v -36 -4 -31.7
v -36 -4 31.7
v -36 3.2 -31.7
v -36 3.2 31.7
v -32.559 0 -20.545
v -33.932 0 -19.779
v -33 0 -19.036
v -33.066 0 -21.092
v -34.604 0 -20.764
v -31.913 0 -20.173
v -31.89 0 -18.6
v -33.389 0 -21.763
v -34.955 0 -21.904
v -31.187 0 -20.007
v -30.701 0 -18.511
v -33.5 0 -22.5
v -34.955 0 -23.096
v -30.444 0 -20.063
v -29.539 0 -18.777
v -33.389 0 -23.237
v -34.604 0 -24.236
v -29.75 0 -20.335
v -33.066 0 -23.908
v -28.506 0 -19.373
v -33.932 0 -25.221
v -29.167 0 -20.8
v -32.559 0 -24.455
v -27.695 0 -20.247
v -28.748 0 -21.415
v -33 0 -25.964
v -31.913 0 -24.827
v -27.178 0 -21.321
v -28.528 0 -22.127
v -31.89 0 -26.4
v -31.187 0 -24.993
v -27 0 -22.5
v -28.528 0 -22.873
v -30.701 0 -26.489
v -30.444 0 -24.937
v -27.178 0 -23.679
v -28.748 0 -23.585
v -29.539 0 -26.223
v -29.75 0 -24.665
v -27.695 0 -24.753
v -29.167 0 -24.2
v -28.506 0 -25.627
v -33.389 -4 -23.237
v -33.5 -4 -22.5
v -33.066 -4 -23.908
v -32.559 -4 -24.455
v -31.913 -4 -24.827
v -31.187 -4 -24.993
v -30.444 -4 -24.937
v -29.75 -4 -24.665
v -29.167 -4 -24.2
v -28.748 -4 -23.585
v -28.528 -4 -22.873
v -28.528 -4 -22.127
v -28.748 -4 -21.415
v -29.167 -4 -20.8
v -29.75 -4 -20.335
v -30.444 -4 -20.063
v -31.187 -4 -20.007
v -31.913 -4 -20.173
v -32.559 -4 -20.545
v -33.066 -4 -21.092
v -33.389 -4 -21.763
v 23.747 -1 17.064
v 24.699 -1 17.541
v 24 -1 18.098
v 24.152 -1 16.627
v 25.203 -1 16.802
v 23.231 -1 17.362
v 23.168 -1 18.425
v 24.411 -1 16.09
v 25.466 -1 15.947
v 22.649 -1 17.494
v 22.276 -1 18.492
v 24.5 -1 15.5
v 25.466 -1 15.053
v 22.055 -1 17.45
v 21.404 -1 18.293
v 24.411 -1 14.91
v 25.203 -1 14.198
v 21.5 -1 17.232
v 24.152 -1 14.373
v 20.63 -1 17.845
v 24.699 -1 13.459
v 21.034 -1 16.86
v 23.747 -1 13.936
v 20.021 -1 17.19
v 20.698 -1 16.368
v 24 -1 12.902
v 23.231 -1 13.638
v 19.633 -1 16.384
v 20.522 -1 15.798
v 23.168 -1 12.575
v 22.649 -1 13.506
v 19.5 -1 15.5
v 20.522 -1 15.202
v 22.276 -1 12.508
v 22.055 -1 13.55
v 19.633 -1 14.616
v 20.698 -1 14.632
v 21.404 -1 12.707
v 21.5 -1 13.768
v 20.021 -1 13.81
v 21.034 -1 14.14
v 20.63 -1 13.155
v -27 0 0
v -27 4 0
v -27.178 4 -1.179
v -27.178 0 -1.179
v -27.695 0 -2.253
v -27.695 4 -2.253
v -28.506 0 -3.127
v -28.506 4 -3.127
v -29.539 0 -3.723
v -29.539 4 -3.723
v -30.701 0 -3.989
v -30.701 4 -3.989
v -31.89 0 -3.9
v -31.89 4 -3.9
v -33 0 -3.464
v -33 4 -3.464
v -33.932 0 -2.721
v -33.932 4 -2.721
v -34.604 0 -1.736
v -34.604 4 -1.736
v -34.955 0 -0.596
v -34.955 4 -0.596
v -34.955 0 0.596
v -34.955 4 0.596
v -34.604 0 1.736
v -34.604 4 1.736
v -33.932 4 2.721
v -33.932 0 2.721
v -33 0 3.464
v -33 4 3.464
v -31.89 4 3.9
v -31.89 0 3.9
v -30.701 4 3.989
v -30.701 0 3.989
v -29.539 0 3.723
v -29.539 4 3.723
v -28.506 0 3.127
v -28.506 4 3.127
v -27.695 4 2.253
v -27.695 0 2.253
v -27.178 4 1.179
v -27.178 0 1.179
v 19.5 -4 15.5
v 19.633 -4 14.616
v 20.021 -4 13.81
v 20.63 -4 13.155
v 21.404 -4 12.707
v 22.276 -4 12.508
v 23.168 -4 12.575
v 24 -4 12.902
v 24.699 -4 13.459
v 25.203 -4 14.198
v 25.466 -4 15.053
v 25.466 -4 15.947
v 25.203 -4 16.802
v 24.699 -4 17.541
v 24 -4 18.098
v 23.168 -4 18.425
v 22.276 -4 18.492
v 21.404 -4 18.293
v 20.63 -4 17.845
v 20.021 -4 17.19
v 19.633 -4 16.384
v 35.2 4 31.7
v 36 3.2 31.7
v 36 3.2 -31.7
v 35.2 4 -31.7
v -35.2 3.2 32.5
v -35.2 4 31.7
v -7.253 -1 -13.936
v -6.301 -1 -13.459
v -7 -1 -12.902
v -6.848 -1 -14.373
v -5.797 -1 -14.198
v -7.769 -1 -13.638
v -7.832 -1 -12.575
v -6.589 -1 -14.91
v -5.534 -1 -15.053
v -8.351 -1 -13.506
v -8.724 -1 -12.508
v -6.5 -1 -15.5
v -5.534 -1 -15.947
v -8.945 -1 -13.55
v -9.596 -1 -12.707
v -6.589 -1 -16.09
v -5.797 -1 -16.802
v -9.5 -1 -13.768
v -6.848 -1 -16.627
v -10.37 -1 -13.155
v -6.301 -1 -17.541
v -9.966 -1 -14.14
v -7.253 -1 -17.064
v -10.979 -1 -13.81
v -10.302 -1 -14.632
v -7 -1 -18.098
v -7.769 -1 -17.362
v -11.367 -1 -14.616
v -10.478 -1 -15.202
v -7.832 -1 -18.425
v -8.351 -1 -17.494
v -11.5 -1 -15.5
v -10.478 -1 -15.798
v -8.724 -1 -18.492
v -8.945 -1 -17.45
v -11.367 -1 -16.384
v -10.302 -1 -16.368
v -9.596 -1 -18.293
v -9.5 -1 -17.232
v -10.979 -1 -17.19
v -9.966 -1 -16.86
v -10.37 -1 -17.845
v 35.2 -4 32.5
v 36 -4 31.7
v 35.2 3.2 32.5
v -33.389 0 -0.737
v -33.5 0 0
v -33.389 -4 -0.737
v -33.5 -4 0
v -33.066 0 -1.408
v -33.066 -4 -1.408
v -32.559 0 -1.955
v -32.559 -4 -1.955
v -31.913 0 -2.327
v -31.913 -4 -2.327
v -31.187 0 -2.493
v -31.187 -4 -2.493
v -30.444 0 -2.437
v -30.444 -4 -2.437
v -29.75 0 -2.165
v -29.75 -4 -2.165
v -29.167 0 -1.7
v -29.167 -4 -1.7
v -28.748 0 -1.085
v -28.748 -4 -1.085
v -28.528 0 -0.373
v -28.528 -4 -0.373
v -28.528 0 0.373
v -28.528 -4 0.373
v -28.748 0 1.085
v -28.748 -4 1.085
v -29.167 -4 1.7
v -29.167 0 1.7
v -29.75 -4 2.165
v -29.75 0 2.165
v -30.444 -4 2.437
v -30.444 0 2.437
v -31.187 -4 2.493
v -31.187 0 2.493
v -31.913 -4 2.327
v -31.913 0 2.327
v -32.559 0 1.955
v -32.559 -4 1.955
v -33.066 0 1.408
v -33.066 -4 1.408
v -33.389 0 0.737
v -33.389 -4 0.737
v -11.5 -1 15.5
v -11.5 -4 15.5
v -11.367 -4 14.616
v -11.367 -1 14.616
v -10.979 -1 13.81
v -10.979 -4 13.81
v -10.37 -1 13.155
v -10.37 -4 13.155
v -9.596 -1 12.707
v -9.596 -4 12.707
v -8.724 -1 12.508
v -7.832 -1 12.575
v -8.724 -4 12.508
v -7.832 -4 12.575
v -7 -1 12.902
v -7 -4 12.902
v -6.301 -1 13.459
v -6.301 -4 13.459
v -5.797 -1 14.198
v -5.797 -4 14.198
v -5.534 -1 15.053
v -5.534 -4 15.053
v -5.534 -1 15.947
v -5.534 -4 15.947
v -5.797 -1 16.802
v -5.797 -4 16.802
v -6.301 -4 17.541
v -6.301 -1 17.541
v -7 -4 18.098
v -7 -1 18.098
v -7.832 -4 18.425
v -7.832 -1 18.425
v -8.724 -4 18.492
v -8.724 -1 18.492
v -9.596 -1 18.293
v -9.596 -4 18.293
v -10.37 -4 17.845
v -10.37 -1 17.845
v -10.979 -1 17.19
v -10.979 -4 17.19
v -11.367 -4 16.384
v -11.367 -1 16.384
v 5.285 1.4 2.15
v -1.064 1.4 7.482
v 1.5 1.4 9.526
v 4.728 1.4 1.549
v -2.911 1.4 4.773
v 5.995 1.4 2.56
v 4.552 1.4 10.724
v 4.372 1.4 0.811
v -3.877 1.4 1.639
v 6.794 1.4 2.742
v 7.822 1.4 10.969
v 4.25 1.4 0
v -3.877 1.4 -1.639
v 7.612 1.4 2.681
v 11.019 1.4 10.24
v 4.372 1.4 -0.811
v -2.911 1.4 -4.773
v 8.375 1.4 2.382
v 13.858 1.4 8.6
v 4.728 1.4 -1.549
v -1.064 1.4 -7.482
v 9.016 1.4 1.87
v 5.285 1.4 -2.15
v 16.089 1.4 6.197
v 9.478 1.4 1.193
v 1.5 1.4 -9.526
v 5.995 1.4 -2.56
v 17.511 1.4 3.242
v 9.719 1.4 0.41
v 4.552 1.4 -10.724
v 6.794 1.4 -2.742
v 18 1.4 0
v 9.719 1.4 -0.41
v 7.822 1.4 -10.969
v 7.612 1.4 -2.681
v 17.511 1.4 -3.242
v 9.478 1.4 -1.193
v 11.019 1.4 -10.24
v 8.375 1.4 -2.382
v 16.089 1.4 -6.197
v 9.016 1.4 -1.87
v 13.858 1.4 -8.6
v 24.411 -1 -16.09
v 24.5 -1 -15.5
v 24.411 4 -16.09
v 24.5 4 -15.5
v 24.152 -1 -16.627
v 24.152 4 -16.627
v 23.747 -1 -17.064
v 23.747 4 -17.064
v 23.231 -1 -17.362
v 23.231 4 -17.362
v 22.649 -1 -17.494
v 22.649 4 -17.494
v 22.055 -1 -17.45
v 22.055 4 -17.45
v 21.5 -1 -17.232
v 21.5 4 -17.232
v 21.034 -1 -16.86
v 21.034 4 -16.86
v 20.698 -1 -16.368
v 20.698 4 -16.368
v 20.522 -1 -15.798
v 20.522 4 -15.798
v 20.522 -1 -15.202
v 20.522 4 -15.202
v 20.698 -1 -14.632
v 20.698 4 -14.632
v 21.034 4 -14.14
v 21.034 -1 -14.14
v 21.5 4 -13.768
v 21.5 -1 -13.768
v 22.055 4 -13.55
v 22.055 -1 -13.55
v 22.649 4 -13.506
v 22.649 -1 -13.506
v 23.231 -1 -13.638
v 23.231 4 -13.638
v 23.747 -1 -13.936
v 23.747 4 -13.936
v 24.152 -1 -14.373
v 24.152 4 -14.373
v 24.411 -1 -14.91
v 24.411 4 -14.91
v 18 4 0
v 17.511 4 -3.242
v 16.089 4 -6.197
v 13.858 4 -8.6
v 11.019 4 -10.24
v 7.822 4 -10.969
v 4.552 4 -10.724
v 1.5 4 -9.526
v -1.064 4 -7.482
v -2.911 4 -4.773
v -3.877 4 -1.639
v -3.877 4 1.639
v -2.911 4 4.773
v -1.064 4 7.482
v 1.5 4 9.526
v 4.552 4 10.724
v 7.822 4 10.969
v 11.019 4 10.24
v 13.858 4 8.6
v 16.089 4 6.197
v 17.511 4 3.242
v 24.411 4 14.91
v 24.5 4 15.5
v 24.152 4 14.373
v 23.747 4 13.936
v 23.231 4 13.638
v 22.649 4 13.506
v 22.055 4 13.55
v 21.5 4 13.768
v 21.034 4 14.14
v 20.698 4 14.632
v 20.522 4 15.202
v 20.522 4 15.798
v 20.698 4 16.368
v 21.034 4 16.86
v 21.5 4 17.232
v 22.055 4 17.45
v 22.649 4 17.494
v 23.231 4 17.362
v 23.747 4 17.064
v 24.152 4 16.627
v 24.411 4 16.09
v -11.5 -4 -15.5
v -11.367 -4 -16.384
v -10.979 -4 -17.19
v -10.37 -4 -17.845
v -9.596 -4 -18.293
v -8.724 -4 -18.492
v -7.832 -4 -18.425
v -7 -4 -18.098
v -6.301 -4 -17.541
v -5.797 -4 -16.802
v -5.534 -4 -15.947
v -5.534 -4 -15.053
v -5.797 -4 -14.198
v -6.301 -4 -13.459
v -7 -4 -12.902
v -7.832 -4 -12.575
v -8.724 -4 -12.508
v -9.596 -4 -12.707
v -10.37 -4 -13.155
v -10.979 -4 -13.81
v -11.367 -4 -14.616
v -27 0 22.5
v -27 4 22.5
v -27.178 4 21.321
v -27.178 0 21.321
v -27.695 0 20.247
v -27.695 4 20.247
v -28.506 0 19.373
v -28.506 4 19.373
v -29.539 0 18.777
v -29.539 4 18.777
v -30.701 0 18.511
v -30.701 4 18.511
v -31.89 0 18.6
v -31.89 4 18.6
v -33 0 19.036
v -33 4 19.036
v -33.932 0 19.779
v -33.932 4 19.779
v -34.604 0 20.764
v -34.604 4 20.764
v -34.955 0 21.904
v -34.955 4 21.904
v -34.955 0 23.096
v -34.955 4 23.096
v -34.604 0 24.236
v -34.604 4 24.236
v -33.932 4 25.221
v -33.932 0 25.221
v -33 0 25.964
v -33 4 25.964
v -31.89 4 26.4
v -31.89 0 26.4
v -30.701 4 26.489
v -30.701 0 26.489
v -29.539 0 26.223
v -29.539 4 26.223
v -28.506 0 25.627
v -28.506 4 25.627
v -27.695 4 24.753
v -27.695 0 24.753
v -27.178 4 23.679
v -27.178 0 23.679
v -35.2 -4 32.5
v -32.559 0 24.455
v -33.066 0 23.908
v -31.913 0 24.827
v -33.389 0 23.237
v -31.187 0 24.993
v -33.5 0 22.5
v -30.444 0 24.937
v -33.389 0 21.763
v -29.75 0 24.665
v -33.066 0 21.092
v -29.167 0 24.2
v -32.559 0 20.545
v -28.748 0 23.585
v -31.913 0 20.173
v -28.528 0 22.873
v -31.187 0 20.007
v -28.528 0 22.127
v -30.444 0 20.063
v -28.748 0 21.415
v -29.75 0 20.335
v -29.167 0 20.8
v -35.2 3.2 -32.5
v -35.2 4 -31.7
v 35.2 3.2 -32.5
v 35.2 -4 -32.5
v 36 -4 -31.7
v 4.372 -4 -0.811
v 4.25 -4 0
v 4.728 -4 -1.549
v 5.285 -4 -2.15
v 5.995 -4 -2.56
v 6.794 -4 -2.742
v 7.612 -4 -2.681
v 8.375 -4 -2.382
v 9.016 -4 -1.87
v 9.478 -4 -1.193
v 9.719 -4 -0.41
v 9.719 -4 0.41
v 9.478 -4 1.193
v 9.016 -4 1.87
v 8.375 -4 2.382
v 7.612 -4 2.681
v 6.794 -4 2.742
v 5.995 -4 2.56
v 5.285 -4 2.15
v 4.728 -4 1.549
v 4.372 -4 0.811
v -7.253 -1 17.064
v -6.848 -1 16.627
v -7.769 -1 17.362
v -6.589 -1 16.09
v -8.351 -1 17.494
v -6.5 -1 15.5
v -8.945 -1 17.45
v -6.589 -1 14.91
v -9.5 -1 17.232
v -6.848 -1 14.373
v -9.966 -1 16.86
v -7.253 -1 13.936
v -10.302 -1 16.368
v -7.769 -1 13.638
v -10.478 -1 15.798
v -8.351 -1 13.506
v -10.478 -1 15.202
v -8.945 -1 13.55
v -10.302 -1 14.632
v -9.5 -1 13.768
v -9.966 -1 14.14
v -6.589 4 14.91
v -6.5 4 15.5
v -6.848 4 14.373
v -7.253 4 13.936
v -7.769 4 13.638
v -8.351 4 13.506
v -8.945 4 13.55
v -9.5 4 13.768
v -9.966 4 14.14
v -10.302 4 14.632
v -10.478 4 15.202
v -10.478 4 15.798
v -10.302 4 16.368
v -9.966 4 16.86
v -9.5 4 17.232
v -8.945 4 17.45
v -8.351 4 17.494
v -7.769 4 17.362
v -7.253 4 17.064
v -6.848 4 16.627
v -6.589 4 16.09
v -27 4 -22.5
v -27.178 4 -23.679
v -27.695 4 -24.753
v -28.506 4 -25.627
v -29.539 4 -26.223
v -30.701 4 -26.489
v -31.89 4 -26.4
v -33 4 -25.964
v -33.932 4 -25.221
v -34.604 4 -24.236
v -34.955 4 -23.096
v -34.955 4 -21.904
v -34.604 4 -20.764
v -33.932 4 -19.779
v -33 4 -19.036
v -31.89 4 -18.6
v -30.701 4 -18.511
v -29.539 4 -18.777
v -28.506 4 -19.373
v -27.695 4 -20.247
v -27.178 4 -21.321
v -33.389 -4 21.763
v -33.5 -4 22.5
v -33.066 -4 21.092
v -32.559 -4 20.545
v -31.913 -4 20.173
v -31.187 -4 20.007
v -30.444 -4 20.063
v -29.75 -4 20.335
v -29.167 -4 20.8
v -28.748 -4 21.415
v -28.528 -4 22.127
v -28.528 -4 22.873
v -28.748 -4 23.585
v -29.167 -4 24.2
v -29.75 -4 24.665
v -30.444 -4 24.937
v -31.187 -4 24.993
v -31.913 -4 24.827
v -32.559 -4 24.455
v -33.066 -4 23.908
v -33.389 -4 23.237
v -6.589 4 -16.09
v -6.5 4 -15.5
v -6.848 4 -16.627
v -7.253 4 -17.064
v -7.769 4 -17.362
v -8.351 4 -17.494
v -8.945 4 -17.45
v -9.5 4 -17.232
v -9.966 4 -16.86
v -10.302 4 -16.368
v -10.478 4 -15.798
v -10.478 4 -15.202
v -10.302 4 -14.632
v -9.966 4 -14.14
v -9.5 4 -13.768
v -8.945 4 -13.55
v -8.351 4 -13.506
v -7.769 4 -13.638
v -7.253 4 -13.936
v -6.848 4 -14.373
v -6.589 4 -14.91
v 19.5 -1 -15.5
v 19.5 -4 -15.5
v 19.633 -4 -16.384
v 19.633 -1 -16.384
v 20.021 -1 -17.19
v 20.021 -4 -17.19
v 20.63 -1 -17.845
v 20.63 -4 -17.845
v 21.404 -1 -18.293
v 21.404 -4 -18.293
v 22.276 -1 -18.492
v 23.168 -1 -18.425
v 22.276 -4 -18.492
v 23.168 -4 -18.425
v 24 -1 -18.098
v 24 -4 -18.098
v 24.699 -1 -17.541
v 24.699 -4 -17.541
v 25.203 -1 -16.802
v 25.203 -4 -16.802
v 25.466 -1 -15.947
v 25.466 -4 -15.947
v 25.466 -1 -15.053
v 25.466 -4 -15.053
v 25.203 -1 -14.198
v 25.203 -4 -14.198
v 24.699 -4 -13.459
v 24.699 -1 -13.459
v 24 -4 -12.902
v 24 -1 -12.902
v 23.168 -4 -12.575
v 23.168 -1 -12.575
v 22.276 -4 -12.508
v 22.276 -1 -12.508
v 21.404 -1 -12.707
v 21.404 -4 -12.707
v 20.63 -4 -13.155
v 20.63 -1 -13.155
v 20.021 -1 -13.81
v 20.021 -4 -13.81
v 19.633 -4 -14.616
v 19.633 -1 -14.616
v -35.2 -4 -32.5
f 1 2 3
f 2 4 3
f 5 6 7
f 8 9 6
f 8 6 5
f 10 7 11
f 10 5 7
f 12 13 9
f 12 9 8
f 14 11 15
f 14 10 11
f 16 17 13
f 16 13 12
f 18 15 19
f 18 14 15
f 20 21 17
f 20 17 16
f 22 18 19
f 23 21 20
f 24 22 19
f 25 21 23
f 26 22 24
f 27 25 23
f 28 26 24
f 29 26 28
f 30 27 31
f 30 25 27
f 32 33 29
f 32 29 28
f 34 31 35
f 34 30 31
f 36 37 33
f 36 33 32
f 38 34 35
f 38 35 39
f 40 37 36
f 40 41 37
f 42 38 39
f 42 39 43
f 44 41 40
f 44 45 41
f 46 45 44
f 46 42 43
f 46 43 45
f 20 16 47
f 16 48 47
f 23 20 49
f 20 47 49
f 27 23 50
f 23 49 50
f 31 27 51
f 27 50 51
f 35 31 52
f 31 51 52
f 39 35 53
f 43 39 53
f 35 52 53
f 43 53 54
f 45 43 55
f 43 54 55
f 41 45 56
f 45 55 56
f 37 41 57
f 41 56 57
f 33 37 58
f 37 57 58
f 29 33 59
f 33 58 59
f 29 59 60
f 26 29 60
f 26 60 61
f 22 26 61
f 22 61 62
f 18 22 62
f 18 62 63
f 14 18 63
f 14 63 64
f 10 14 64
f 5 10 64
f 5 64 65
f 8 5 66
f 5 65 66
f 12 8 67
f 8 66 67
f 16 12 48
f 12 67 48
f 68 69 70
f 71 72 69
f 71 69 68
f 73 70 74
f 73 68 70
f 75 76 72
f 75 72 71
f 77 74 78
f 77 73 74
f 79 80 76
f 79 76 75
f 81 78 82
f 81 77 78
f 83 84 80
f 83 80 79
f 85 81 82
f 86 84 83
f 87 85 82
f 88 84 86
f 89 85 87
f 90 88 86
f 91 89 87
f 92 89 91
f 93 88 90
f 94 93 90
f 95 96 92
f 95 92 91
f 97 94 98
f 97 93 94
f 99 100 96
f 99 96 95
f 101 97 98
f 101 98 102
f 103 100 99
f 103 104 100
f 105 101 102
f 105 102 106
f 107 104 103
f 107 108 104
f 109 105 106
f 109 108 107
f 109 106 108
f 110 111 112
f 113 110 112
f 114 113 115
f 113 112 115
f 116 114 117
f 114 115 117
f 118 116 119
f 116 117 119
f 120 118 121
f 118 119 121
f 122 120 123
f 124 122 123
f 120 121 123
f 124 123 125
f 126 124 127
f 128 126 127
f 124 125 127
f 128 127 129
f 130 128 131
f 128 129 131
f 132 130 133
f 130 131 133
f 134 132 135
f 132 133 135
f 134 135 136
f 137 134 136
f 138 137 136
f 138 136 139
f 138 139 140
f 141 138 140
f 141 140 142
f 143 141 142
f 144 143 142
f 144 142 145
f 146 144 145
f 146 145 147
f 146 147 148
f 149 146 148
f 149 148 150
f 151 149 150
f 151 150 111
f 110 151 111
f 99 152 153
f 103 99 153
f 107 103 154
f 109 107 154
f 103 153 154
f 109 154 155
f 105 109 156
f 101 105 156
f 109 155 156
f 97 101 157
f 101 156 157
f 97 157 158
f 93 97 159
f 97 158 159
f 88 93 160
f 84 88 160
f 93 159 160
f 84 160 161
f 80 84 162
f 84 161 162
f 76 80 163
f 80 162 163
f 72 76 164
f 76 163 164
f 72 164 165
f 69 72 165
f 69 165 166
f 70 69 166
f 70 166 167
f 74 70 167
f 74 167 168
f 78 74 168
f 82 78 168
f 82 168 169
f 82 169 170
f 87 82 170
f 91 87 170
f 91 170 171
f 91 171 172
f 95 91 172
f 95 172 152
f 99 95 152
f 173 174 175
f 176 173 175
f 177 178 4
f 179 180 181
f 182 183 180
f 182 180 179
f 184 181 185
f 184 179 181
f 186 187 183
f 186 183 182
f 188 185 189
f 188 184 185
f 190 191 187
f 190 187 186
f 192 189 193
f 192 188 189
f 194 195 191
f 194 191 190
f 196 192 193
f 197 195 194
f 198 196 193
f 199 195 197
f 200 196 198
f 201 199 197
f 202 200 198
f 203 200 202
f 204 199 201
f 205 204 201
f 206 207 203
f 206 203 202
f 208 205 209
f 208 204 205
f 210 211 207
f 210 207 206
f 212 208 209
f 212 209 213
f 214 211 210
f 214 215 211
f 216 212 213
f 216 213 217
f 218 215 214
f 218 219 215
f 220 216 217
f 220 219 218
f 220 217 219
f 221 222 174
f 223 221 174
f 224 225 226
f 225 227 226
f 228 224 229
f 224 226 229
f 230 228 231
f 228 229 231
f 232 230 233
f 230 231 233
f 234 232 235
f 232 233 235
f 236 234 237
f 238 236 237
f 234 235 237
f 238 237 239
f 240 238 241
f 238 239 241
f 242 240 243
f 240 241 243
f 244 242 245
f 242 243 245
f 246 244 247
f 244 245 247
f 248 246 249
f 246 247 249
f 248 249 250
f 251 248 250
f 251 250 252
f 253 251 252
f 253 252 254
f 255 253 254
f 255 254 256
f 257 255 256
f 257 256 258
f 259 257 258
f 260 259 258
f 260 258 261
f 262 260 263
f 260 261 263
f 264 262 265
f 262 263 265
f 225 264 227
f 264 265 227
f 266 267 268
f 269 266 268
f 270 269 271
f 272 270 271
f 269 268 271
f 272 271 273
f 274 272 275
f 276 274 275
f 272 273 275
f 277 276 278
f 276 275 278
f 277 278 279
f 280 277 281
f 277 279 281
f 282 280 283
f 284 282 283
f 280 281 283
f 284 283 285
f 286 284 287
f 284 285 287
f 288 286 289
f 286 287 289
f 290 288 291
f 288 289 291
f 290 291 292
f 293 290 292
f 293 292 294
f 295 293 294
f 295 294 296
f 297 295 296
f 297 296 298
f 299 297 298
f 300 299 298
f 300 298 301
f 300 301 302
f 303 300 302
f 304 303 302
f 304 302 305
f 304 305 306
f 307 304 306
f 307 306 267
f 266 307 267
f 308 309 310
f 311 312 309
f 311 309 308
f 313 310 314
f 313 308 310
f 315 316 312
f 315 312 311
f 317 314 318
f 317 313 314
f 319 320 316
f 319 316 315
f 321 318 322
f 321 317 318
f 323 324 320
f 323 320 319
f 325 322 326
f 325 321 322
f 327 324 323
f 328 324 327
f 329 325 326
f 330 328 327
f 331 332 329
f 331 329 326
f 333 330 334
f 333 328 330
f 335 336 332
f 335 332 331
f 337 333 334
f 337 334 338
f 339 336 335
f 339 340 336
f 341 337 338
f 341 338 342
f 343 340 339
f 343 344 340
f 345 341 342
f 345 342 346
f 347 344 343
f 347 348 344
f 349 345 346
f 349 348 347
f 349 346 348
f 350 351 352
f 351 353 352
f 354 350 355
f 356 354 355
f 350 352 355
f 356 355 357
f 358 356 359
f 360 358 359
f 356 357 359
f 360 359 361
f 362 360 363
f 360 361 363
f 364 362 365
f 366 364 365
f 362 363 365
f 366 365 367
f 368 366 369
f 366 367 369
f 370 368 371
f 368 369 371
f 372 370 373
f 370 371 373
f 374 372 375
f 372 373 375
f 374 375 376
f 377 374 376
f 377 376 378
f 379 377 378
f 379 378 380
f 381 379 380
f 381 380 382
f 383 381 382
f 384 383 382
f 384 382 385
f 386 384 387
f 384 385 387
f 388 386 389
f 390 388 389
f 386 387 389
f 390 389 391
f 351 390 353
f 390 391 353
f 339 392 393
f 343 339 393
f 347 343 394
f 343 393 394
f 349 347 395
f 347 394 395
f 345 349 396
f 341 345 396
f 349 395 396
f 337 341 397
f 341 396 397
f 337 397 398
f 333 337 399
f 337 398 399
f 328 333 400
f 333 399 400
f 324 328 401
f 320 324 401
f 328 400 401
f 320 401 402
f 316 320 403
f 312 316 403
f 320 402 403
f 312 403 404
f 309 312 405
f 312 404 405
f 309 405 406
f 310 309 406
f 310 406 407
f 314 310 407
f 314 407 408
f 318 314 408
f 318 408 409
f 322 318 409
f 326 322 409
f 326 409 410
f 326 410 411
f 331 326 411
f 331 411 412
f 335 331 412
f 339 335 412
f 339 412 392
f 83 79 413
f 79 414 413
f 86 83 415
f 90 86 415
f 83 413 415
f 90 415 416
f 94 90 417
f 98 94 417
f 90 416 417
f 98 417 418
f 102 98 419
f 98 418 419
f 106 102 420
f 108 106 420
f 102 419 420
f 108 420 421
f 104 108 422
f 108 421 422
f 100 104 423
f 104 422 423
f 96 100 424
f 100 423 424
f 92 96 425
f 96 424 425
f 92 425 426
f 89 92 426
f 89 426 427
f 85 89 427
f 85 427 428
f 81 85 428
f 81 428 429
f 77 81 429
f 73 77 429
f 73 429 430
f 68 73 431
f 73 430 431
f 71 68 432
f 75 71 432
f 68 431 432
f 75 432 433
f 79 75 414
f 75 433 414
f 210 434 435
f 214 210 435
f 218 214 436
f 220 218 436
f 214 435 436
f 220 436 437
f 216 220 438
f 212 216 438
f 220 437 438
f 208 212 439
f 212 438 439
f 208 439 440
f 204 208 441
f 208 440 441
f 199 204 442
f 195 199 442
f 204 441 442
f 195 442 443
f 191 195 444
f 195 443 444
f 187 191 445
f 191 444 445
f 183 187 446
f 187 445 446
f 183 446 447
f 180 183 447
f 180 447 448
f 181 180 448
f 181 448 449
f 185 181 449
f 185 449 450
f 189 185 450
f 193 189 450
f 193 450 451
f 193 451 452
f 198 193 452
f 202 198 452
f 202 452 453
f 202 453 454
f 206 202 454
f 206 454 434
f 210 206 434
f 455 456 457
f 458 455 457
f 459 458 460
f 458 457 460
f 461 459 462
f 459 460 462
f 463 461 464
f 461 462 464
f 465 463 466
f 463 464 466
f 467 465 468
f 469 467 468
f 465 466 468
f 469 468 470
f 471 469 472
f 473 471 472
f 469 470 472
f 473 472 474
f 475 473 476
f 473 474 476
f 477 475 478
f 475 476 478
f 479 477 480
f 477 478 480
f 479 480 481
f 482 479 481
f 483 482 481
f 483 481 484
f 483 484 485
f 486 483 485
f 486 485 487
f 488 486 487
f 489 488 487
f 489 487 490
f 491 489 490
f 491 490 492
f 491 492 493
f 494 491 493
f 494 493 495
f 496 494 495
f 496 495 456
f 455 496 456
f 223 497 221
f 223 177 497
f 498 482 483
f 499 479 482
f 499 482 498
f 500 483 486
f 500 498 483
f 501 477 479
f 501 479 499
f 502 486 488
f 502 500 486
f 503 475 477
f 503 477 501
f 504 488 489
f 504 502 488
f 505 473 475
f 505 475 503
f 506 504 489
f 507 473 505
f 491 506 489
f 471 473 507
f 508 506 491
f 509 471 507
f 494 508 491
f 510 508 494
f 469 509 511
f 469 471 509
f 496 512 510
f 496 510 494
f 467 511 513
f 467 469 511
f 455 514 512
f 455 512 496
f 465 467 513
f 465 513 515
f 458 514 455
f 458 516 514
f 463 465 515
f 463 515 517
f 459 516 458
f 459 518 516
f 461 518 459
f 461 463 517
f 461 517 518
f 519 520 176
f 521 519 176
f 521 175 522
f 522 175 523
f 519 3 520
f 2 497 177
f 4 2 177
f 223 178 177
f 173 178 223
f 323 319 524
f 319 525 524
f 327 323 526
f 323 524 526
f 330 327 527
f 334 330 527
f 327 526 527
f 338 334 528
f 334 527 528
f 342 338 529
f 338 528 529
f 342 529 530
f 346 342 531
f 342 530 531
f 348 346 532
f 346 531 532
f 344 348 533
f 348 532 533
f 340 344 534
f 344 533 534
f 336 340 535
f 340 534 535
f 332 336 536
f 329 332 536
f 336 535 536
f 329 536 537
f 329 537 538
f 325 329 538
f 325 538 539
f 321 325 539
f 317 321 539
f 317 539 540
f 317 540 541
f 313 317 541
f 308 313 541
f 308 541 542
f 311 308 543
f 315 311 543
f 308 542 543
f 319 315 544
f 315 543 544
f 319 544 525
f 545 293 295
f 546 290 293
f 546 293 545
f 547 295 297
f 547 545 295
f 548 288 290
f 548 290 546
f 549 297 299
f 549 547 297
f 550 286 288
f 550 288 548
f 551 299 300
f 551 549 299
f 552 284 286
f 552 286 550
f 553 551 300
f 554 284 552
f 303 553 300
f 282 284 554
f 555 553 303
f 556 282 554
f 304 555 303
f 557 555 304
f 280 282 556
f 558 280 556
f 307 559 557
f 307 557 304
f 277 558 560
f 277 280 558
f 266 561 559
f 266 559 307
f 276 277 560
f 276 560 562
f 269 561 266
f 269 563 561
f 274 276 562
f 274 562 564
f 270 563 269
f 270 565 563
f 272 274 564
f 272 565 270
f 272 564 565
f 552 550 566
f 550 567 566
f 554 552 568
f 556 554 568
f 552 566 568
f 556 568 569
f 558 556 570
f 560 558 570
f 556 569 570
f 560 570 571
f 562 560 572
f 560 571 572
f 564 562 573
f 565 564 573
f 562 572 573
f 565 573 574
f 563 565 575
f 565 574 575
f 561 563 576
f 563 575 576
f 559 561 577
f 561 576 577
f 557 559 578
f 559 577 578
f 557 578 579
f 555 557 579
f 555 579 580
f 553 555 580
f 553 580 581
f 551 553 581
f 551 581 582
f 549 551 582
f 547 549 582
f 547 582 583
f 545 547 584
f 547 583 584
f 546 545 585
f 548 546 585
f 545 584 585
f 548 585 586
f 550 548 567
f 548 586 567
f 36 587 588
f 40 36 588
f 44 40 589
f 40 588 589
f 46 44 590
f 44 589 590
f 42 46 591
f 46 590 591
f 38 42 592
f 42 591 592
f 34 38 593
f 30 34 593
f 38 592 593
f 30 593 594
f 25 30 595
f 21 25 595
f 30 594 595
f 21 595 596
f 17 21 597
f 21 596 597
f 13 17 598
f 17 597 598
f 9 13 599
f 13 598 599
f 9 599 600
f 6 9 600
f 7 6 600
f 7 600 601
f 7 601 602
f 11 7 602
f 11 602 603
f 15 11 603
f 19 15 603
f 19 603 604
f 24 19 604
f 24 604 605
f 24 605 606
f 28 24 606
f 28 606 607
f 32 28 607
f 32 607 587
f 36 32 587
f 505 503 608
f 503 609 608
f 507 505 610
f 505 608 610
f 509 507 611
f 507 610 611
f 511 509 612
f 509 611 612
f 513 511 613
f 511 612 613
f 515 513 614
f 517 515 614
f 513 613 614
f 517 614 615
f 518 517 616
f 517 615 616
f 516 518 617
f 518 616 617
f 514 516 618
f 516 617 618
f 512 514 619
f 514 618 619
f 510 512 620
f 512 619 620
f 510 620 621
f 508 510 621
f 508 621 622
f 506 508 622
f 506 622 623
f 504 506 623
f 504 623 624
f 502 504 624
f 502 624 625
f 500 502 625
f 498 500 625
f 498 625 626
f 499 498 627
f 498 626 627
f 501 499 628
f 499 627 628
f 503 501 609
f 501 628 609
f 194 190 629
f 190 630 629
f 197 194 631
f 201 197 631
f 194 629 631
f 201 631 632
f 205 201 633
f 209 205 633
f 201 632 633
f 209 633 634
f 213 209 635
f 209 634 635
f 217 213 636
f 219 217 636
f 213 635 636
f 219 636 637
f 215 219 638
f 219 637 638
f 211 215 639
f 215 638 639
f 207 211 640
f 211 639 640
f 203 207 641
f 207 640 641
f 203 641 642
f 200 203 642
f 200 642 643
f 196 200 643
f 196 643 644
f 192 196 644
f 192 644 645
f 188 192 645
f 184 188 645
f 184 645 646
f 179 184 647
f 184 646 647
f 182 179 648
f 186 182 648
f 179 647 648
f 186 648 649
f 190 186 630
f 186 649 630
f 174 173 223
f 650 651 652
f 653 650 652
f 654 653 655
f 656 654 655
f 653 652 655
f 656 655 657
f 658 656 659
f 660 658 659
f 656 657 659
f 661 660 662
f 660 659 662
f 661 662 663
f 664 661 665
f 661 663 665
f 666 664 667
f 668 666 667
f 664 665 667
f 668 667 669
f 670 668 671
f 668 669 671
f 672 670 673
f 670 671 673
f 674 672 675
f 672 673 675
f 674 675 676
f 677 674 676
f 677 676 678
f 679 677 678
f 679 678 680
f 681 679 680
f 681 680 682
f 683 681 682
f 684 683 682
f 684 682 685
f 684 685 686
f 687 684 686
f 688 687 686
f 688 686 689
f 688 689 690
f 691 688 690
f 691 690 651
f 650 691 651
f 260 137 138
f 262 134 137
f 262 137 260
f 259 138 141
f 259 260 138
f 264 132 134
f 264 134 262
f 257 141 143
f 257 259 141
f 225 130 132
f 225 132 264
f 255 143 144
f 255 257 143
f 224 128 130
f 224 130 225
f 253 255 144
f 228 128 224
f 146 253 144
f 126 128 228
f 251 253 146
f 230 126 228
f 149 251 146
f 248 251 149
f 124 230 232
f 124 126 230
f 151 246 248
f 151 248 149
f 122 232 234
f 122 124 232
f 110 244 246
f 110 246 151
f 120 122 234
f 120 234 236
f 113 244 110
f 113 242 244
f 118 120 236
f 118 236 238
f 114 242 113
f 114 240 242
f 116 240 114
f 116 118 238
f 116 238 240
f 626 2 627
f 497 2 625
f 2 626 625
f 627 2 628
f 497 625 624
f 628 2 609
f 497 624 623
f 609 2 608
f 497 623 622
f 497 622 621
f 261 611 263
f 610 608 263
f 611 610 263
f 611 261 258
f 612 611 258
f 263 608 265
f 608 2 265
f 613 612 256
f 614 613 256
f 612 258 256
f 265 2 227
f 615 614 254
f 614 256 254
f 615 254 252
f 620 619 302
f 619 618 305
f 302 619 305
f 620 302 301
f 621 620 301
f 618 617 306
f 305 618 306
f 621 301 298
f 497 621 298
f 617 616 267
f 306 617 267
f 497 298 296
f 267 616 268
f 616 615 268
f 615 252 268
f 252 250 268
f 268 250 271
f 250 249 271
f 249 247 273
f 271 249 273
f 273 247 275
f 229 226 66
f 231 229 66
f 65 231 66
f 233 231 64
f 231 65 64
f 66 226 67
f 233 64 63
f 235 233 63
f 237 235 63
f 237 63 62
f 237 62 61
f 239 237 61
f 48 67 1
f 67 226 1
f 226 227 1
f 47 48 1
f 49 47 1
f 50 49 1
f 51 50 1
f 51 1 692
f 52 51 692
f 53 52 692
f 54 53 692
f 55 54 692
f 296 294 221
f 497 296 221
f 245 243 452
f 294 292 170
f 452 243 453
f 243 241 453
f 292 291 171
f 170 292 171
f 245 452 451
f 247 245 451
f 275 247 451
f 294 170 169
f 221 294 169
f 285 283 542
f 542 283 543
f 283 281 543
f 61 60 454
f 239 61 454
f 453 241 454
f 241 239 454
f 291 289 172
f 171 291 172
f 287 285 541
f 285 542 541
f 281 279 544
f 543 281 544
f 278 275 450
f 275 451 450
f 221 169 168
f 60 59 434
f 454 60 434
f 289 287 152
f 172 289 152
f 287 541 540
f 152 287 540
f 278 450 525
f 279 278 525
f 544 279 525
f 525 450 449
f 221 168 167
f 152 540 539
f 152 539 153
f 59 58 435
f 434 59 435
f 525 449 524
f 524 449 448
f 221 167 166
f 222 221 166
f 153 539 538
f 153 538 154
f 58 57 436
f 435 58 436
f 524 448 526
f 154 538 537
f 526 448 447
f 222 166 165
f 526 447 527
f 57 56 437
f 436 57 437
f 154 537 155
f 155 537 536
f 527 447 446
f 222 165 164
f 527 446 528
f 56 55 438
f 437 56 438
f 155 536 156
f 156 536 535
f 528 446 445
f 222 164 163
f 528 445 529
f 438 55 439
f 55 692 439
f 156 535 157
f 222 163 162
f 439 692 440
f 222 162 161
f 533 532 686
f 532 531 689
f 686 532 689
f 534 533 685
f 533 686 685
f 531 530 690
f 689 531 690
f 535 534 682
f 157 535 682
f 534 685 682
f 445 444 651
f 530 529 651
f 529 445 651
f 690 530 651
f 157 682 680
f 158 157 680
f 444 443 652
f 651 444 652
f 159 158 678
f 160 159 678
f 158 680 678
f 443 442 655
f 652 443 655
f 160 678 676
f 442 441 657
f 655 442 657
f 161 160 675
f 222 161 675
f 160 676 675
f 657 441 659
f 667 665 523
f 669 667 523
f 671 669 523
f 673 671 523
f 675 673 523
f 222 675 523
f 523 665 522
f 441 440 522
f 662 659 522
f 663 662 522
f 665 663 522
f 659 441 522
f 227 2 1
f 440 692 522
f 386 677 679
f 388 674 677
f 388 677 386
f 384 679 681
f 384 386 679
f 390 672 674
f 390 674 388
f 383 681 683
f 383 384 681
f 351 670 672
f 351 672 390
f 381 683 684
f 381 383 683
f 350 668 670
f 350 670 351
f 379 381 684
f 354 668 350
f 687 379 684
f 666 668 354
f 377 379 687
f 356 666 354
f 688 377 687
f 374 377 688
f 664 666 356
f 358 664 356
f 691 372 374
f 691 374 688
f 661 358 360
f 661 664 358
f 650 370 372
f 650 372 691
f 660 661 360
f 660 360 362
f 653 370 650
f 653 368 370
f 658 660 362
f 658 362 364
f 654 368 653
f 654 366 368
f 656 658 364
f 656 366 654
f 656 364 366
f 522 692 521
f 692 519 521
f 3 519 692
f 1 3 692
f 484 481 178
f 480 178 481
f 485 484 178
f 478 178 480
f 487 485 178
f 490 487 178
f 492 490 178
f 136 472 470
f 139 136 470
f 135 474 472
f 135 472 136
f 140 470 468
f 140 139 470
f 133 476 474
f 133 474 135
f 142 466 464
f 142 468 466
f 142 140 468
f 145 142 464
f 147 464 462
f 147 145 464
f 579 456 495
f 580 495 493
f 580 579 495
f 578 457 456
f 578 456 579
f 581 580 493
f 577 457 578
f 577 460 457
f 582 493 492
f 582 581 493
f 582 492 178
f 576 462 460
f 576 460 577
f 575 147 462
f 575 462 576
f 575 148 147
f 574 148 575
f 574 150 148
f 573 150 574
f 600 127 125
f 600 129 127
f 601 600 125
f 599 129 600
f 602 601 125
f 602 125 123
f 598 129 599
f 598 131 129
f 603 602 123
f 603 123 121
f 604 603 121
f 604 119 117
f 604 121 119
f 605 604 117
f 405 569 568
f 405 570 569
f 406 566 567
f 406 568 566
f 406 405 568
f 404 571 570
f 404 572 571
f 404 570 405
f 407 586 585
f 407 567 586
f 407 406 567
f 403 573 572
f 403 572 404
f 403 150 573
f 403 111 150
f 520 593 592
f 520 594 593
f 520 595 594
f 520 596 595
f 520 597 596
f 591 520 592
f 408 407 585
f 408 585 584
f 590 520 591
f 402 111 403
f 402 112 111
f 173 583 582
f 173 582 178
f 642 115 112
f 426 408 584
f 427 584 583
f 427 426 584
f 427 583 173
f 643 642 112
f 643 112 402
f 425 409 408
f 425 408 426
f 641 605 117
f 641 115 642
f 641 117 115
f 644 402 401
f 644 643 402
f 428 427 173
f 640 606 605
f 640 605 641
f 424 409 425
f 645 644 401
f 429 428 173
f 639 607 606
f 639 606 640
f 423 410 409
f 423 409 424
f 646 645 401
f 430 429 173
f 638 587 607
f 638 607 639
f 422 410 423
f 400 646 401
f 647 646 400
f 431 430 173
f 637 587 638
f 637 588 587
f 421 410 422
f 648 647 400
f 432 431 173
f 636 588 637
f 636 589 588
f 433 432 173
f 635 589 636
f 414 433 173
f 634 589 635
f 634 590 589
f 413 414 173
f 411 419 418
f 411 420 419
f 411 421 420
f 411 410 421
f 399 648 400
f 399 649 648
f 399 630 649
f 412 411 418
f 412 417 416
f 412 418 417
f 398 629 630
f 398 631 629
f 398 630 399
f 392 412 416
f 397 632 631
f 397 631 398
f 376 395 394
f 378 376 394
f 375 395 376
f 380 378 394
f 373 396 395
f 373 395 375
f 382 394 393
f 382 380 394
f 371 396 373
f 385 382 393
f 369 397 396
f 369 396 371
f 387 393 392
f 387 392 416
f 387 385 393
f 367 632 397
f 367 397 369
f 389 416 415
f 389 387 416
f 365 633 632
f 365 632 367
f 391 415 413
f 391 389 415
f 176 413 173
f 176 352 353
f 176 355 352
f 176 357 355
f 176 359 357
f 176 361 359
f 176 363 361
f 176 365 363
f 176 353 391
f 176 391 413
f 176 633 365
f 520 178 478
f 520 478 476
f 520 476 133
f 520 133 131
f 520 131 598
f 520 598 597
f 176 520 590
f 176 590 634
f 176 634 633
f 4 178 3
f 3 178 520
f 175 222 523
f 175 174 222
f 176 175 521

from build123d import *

# Parameters (mm, degrees)
SKETCH_1_W                = 72
SKETCH_1_H                = 65
EXTRUDE_1_DEPTH           = 4
HOLE_WIZARD_1_D           = 5.5
HOLE_WIZARD_1_DEPTH       = 100
HOLE_WIZARD_1_CBORE_D     = 22
HOLE_WIZARD_1_CBORE_DEPTH = 2.6
HOLE_WIZARD_2_D           = 4
HOLE_WIZARD_2_DEPTH       = 100
HOLE_WIZARD_2_CBORE_D     = 6
HOLE_WIZARD_2_CBORE_DEPTH = 3
HOLE_WIZARD_3_D           = 5
HOLE_WIZARD_3_DEPTH       = 100
HOLE_WIZARD_3_CBORE_D     = 8
HOLE_WIZARD_3_CBORE_DEPTH = 4
CHAMFER_1_SIZE            = 0.8


with BuildPart() as part:
    # 草图1 → 凸台-拉伸1 (new, symmetric)
    with BuildSketch(Plane(origin=(0, 0, 0), x_dir=(1, 0, 0), z_dir=(0, 1, 0))):
        Rectangle(SKETCH_1_W, SKETCH_1_H)
    extrude(amount=EXTRUDE_1_DEPTH, both=True)

    # 孔1
    with Locations(Plane(origin=(0, 4, 0), x_dir=(1, 0, 0), z_dir=(0, 1, 0))):
        with Locations((7, 0)):
            CounterBoreHole(HOLE_WIZARD_1_D / 2, HOLE_WIZARD_1_CBORE_D / 2, HOLE_WIZARD_1_CBORE_DEPTH, depth=HOLE_WIZARD_1_DEPTH)

    # 孔2
    with Locations(Plane(origin=(0, -4, 0), x_dir=(-1, 0, 0), z_dir=(0, -1, 0))):
        with Locations((-22.5, 15.5), (8.5, 15.5), (8.5, -15.5), (-22.5, -15.5)):
            CounterBoreHole(HOLE_WIZARD_2_D / 2, HOLE_WIZARD_2_CBORE_D / 2, HOLE_WIZARD_2_CBORE_DEPTH, depth=HOLE_WIZARD_2_DEPTH)

    # 孔3
    with Locations(Plane(origin=(0, 4, 0), x_dir=(1, 0, 0), z_dir=(0, 1, 0))):
        with Locations((-31, 22.5), (-31, 0), (-31, -22.5)):
            CounterBoreHole(HOLE_WIZARD_3_D / 2, HOLE_WIZARD_3_CBORE_D / 2, HOLE_WIZARD_3_CBORE_DEPTH, depth=HOLE_WIZARD_3_DEPTH)

    # 倒角1
    chamfer_1_edges = [part.edges().sort_by_distance(p)[0] for p in [
        (-36, 4, 0),
        (0, 4, 32.5),
        (36, 4, 0),
        (36, 0, 32.5),
        (-36, 0, 32.5),
        (-36, 0, -32.5),
        (36, 0, -32.5),
        (0, 4, -32.5),
    ]]
    chamfer(chamfer_1_edges, length=CHAMFER_1_SIZE)


solid = part.part
